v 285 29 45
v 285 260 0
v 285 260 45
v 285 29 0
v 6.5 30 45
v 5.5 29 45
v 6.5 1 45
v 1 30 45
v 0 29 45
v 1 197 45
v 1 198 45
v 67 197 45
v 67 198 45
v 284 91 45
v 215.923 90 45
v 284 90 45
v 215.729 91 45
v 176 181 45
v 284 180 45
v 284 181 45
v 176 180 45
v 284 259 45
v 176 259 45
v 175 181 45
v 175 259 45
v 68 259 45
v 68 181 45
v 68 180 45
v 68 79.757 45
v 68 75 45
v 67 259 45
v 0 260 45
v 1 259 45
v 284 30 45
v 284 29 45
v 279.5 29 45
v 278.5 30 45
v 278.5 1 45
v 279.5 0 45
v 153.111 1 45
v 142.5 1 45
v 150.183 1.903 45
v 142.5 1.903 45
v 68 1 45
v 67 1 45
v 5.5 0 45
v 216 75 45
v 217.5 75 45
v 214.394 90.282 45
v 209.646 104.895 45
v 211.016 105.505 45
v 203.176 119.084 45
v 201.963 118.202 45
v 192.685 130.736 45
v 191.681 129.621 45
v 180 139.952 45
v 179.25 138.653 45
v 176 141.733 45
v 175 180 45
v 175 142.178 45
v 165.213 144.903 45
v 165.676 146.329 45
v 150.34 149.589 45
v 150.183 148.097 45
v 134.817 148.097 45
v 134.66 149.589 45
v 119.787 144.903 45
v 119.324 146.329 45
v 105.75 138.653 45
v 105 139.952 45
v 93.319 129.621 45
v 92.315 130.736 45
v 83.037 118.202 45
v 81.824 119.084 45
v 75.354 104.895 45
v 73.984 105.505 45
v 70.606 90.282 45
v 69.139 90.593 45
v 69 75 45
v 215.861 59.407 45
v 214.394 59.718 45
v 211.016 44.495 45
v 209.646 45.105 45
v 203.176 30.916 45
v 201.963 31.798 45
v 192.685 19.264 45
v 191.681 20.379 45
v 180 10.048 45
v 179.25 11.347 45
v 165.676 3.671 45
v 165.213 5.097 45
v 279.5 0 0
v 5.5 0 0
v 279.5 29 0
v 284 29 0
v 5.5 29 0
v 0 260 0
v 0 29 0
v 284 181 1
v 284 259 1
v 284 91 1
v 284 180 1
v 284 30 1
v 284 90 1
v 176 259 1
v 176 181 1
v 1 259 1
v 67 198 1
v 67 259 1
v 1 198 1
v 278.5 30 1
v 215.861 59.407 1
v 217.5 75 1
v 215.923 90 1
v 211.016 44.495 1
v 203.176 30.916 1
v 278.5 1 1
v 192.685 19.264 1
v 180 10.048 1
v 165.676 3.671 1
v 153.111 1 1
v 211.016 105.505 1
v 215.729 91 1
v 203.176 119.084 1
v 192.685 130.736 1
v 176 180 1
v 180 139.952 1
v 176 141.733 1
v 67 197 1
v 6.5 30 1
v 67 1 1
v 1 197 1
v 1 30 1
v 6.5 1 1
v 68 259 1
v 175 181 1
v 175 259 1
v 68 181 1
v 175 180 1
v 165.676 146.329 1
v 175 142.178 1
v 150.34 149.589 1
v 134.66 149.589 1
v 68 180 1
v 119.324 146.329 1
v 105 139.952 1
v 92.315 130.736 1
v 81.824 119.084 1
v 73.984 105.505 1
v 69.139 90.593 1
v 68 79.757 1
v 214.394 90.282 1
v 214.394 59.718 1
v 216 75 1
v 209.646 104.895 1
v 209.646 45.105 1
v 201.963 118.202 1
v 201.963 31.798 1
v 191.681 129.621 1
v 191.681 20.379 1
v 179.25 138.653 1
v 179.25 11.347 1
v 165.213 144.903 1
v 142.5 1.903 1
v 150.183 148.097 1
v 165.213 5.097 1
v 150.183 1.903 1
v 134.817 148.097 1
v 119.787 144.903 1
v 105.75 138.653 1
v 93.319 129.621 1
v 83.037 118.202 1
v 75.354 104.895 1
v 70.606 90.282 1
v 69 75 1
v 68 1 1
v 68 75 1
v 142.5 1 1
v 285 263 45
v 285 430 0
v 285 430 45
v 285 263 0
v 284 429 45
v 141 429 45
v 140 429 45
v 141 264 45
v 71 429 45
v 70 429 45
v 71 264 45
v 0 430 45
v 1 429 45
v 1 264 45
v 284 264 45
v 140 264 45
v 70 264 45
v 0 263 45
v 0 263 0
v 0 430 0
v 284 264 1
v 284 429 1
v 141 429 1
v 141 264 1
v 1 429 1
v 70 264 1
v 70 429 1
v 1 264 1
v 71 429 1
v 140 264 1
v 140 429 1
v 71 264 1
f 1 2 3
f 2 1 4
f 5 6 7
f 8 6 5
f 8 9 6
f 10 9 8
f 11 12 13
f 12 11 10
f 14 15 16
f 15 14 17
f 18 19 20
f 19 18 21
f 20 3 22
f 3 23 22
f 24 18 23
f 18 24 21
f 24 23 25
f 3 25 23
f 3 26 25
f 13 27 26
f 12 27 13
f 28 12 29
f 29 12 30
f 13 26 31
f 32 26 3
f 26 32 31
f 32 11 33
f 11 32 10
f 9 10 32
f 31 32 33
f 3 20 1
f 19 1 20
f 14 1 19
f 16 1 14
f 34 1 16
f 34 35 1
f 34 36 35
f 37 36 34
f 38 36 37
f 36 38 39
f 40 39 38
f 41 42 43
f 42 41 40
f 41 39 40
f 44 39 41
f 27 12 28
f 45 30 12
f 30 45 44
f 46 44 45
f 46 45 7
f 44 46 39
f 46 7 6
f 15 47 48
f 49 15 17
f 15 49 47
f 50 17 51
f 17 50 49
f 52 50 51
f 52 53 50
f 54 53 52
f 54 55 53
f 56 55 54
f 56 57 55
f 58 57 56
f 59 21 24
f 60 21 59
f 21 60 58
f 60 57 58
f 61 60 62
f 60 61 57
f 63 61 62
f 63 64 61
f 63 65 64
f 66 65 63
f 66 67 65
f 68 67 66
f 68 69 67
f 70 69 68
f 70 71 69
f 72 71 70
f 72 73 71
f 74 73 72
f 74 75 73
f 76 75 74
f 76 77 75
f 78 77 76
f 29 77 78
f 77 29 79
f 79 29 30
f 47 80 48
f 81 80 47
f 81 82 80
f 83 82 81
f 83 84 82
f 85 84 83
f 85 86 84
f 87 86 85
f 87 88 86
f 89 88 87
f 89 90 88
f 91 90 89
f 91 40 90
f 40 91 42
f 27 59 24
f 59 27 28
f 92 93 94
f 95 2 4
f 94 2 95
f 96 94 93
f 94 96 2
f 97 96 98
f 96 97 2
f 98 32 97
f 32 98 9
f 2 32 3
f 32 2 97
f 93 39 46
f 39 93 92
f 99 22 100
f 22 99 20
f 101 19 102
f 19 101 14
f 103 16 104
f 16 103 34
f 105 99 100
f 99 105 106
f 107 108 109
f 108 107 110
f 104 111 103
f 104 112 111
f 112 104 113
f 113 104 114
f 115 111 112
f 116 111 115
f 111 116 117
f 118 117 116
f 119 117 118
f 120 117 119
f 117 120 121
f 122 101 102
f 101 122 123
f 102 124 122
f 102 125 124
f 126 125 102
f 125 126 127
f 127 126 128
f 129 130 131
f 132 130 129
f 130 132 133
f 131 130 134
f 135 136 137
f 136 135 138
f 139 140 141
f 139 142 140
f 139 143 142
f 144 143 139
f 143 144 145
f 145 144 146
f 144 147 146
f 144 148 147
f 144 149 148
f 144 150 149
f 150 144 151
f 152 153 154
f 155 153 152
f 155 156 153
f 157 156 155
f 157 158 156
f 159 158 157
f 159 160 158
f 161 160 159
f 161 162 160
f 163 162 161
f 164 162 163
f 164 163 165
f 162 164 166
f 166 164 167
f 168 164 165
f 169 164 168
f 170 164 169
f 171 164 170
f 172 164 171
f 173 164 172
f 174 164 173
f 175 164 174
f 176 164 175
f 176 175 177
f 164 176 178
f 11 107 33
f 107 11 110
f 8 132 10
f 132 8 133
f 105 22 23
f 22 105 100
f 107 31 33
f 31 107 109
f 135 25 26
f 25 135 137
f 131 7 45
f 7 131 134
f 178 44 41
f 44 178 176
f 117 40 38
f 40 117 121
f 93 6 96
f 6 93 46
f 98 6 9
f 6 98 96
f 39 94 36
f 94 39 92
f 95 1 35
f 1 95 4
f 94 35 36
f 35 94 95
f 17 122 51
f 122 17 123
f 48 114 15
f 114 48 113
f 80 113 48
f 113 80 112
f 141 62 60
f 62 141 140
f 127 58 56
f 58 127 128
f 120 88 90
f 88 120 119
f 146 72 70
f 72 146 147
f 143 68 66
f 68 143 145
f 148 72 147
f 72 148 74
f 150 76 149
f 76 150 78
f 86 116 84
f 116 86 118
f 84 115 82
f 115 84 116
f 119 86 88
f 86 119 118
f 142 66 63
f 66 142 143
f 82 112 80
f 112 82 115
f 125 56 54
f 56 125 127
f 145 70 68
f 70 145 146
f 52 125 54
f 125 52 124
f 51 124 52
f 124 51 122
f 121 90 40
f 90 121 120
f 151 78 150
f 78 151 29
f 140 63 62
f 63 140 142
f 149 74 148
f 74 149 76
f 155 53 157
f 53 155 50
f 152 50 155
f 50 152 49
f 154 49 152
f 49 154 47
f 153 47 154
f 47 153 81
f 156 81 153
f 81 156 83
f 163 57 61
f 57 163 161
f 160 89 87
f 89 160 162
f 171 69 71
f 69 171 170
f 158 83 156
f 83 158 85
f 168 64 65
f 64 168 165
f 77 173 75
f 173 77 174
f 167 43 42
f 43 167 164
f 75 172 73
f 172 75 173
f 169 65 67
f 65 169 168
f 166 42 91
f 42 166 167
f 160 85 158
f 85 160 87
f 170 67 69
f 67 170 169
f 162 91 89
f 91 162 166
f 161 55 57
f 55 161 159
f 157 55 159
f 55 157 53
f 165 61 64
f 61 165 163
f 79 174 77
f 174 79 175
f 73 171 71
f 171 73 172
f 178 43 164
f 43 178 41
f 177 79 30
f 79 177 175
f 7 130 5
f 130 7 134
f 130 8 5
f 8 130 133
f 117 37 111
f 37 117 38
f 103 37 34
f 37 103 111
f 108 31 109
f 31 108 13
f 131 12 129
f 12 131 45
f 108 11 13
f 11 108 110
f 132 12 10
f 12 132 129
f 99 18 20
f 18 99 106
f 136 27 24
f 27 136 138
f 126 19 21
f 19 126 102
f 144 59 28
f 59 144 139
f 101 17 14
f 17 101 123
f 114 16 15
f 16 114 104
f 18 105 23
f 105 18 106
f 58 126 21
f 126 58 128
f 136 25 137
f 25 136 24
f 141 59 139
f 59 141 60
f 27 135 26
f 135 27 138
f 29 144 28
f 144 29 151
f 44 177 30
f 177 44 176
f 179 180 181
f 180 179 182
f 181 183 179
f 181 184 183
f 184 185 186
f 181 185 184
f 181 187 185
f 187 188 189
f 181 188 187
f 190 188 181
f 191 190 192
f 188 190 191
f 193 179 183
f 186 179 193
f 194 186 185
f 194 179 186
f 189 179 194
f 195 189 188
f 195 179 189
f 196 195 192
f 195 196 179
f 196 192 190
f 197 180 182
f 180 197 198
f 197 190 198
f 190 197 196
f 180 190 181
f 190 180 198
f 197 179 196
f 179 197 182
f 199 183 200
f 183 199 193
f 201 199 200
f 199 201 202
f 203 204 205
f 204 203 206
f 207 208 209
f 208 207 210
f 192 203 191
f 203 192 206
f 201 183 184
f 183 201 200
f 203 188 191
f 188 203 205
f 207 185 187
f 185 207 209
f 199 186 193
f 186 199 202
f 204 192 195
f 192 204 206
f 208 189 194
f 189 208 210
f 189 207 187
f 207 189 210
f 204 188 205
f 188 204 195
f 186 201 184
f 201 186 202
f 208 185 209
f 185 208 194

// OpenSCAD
// Définition des variables
frontZoneDepth = 260; // profondeur de la zone avant (mm)
backZoneDepth = 170; // profondeur de la zone arrière (mm)
totalDepth = frontZoneDepth + backZoneDepth; // profondeur totale (mm)
backZoneStart = totalDepth - 167; // position de la zone arrière (mm)
totalWidth = 285;        // largeur totale (mm)
totalHeight = 45; // hauteur totale (mm)
frontZoneWidth = 274; // largeur de la zone avant (mm)
// hauteur totale (mm)
hasBottom = true;        // avec un fond ou non
bottomThickness = 1;     // épaisseur du fond (mm)
borderThickness = 1;     // épaisseur des bords (mm)
//Variables pour les compartiments
headbandCompartimentSize = 150; // taille (diametre) du compartiment pour le bandeau (mm)
frontNotchWidth = (totalWidth - frontZoneWidth) / 2;//largeur des encoches de la zone reserré à l'avant
frontNotchHeight = 29; // hauteur des encoches de la zone reserré à l'avant
module drawQuadrilateralFrame(width, depth, height, useBottom) {difference() {cube([width, depth, height]);
    translate([borderThickness, borderThickness, useBottom ? bottomThickness : 0]) {cube([width - 2 * borderThickness,
            depth - 2 * borderThickness, height]);}}}

module drawHeadbandFrame(diameter, borderThickness, borderHeight) {difference() {cylinder(h = borderHeight, d = diameter
);
    cylinder(h = borderHeight, d = diameter - borderThickness*3);
    translate([- diameter / 2, - diameter / 2, 0]) {cube([diameter / 2, diameter / 2, borderHeight], center = false);}}

}

module horizontalSeparator(size) {cube([size, borderThickness, totalHeight]);}

module verticalSeparator(size) {cube([borderThickness, size, totalHeight]);}

module drawFrontFrame() {

    //Main front frame
    difference() {drawQuadrilateralFrame(totalWidth, frontZoneDepth, totalHeight, hasBottom);

        //Front notchs
        translate([totalWidth - frontNotchWidth, 0, 0]) {drawQuadrilateralFrame(frontNotchWidth, frontNotchHeight,
        totalHeight, hasBottom);}
        drawQuadrilateralFrame(frontNotchWidth, frontNotchHeight, totalHeight, hasBottom);}

    //Front notchs separators
    translate([frontNotchWidth, 0, 0]) {verticalSeparator(frontNotchHeight + borderThickness);}
    translate([totalWidth - frontNotchWidth - borderThickness, 0, 0]) {verticalSeparator(frontNotchHeight +
        borderThickness);}
    translate([0, frontNotchHeight, 0]) {horizontalSeparator(frontNotchWidth);}
    translate([totalWidth - frontNotchWidth - borderThickness, frontNotchHeight, 0]) {horizontalSeparator(
    frontNotchWidth);}


    // headband
    translate([totalWidth / 2, headbandCompartimentSize / 2, 0]) {drawHeadbandFrame(headbandCompartimentSize,
    borderThickness, totalHeight);}

    translate([0, 197, 0]) {horizontalSeparator(67);}
    translate([67, 180, 0]) {horizontalSeparator(217);}
    translate([215, 90, 0]) {horizontalSeparator(69);}
    translate([175, 141, 0]) {verticalSeparator(119);}
    translate([67, 0, 0]) {verticalSeparator(frontZoneDepth);}}

module drawBackFrame() {//main Back frame
    translate([0, backZoneStart, 0]) {drawQuadrilateralFrame(totalWidth, totalDepth - backZoneStart, totalHeight,
    hasBottom);
        translate([70, 0, 0]) {verticalSeparator(totalDepth - backZoneStart);}
        translate([140, 0, 0]) {verticalSeparator(totalDepth - backZoneStart);}}


}

drawFrontFrame();
drawBackFrame();
